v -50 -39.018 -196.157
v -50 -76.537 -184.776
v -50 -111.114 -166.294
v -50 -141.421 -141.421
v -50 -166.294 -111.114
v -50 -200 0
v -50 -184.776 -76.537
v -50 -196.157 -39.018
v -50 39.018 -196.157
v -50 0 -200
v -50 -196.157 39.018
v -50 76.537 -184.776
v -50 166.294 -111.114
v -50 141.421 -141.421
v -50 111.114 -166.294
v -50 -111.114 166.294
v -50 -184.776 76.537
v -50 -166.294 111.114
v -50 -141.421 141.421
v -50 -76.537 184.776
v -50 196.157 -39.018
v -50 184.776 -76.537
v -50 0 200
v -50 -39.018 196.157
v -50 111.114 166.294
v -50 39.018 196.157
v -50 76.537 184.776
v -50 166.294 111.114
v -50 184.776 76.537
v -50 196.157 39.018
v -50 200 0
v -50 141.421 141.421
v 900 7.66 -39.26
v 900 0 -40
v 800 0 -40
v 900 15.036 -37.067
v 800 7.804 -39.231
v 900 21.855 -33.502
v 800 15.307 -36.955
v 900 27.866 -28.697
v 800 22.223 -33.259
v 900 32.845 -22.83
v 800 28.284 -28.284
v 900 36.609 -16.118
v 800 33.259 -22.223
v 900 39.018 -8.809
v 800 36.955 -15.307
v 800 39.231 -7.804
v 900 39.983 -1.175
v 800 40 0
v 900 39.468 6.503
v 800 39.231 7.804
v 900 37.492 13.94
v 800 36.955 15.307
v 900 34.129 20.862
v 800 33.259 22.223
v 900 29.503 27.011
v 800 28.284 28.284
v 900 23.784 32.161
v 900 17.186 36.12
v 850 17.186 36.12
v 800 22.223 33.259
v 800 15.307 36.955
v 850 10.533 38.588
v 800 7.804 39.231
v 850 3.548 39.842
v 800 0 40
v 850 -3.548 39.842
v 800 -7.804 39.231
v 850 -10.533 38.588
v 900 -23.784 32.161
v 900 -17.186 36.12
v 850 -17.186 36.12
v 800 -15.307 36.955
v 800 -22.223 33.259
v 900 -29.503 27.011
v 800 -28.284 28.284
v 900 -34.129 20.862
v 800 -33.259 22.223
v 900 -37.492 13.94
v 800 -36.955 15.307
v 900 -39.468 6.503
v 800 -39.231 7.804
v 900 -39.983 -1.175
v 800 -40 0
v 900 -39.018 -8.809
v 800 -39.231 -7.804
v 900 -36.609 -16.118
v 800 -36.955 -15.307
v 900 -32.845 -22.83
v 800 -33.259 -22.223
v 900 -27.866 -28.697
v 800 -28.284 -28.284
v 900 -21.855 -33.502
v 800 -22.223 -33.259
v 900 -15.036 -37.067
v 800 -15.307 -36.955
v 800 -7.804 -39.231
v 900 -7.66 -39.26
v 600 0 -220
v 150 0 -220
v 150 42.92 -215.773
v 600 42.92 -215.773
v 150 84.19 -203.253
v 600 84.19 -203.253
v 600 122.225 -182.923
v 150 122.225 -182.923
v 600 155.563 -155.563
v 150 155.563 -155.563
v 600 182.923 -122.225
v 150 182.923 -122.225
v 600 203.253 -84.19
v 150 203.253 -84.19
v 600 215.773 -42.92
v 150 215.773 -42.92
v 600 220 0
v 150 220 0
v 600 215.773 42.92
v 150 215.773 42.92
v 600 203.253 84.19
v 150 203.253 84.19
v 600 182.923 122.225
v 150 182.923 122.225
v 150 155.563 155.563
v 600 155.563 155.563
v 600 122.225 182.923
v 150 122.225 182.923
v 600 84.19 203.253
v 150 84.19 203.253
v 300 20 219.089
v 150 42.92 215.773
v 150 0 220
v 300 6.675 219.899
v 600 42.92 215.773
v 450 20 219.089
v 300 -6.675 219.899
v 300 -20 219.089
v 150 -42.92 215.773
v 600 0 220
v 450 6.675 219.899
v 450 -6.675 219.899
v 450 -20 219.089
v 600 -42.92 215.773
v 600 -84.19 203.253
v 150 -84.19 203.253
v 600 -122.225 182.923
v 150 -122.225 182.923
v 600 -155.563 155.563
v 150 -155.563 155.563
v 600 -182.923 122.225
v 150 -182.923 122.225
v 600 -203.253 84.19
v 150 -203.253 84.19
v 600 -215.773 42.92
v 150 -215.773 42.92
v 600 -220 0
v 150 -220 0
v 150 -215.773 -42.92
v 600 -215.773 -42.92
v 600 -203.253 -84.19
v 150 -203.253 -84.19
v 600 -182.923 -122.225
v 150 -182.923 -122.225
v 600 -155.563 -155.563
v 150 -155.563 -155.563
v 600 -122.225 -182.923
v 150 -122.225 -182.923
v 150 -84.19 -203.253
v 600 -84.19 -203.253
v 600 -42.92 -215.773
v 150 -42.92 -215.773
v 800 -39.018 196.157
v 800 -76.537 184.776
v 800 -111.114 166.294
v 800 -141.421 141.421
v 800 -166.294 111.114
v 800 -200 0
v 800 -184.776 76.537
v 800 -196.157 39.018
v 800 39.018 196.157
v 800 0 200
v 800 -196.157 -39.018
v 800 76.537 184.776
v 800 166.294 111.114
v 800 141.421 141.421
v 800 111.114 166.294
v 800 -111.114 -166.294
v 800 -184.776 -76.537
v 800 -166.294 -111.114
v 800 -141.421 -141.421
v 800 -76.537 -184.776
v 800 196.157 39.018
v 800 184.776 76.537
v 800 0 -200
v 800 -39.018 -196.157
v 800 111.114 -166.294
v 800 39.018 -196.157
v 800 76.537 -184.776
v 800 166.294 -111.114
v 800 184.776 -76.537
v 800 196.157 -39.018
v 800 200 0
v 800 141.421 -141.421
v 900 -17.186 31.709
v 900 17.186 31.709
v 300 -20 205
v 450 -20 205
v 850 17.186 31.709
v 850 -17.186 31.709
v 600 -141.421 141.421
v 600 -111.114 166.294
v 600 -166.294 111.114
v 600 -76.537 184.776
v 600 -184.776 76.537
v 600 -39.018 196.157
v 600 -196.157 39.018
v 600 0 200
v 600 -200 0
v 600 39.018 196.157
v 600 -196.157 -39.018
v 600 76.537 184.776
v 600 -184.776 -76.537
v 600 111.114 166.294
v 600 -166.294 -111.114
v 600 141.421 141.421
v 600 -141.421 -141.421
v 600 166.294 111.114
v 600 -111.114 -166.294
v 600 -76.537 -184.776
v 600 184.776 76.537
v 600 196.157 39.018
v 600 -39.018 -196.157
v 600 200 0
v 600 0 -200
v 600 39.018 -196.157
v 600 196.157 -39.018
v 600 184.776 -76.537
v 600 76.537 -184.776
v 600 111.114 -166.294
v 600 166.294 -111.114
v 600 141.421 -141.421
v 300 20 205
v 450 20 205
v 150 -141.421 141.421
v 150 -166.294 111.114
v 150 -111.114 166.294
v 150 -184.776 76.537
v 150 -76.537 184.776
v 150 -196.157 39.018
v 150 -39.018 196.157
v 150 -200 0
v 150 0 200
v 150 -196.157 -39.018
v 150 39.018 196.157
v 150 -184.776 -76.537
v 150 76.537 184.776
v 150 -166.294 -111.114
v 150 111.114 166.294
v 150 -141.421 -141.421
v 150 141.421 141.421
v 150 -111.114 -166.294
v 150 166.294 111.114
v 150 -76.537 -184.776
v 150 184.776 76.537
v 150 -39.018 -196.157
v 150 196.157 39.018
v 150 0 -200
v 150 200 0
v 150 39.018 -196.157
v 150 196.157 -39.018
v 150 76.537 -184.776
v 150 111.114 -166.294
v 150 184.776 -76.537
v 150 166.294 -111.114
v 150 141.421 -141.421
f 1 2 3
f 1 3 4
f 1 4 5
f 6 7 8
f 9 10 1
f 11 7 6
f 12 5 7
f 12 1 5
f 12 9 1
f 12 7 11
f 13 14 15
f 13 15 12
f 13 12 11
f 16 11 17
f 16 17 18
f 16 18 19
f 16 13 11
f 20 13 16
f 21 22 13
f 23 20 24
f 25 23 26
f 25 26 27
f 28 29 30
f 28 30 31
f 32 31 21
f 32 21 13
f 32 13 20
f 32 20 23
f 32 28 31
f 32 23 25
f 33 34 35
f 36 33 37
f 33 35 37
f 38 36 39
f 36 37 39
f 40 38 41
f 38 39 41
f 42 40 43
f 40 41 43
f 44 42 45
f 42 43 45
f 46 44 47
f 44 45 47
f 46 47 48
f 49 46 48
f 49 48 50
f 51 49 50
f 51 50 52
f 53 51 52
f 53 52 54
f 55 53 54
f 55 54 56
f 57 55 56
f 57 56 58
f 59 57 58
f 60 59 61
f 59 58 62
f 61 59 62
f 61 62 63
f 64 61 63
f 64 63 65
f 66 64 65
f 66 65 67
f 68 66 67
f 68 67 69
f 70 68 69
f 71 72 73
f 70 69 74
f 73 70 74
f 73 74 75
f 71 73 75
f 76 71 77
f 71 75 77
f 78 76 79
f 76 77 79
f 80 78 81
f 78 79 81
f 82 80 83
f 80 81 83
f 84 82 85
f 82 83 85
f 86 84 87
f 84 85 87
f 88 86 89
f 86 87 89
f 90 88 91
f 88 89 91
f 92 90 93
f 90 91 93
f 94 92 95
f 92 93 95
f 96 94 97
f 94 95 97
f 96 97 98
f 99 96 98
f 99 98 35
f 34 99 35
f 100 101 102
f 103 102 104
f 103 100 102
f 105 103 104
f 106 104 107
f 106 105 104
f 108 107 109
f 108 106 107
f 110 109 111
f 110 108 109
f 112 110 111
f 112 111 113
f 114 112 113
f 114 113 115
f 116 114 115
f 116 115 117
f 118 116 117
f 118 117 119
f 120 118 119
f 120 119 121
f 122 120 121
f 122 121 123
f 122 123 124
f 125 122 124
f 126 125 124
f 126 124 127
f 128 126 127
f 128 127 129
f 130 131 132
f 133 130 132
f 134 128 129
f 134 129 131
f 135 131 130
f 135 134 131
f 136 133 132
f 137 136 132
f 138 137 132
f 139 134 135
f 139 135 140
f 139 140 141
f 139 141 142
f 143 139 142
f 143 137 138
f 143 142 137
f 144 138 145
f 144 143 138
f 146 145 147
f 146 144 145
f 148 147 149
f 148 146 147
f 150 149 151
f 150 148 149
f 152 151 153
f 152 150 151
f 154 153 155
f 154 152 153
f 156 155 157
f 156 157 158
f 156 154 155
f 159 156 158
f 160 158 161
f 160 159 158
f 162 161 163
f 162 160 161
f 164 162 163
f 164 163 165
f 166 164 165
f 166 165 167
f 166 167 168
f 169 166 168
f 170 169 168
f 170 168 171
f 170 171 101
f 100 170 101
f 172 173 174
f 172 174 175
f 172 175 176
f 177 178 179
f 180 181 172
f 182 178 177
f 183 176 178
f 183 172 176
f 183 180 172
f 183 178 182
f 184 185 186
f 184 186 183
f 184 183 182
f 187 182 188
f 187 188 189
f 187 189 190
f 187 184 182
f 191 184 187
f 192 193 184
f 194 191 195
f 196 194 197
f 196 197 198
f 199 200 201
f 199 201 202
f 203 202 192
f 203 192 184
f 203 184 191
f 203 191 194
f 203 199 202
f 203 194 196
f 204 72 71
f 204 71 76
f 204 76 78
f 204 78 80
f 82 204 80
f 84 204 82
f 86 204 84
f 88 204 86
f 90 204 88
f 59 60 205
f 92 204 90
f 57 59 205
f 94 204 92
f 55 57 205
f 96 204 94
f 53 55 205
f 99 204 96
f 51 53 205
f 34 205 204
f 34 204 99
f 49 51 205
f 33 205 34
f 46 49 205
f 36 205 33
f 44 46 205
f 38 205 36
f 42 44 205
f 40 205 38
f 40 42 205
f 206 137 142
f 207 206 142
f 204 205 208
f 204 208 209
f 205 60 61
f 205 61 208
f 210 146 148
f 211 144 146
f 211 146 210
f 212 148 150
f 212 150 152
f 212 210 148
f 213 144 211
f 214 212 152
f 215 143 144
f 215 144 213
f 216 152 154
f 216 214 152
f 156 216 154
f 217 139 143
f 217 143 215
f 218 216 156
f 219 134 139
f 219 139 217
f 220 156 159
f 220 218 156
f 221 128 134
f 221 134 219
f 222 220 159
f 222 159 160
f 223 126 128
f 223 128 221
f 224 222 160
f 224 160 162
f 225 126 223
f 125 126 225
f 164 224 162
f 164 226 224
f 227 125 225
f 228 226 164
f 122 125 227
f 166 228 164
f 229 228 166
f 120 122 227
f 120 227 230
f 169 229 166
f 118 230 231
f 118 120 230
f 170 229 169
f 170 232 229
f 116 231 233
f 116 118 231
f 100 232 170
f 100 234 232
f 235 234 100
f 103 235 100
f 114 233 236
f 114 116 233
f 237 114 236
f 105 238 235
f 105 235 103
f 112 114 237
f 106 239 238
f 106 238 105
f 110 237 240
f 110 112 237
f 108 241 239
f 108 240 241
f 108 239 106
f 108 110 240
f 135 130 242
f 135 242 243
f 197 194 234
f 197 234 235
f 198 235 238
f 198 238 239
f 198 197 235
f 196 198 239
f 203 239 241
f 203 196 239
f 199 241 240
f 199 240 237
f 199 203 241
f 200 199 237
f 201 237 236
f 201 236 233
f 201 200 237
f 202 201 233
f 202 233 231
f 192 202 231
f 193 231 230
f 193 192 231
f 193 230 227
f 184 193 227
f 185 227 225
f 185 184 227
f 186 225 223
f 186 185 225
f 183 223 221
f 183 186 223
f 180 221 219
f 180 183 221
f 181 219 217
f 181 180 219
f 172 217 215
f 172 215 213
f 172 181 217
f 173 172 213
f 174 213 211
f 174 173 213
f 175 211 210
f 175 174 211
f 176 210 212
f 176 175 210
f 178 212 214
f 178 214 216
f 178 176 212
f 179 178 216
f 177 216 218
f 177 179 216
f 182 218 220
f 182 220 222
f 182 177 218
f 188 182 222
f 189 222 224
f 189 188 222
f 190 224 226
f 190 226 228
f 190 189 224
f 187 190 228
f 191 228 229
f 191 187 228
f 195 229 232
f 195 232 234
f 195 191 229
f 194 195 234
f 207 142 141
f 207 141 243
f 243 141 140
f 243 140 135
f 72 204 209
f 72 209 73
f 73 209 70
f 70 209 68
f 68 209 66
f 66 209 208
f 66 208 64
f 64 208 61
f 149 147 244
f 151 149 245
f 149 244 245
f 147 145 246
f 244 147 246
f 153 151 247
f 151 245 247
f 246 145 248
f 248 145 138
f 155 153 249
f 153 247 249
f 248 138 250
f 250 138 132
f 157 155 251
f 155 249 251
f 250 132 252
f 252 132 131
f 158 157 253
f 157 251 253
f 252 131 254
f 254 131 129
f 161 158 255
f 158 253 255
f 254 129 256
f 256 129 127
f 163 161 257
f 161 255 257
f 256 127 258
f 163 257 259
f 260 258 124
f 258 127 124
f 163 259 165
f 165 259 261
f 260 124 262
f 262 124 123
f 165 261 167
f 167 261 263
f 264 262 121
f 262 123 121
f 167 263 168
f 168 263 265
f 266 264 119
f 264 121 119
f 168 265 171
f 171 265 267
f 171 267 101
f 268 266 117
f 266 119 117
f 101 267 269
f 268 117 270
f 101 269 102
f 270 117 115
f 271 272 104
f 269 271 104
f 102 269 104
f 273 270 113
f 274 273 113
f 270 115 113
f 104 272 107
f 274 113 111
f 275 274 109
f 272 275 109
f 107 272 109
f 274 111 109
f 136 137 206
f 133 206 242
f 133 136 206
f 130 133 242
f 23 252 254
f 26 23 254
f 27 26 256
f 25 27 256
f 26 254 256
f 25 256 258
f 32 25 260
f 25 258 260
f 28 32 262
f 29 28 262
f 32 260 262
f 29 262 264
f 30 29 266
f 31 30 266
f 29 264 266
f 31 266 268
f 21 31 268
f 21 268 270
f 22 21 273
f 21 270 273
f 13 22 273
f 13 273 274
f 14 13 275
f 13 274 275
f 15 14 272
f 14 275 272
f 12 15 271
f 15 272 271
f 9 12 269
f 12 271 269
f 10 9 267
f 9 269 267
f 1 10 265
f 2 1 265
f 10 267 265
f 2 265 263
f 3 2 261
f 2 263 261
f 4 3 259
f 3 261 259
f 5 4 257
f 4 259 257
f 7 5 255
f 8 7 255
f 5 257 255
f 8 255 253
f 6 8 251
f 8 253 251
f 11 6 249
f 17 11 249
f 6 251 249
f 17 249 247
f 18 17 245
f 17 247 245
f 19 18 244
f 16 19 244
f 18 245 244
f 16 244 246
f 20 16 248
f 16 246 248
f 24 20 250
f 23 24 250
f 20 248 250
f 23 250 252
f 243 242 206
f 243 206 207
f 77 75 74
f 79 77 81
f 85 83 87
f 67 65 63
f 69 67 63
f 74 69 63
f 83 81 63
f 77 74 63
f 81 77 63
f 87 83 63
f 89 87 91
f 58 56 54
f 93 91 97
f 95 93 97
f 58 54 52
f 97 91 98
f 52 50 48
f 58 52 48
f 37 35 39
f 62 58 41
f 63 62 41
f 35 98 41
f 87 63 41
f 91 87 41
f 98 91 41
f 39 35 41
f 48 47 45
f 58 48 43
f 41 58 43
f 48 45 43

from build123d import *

# Parameters (mm, degrees)
SKETCH3_R           = 200
BOSS_EXTRUDE2_DEPTH = 200
SKETCH6_R           = 40
BOSS_EXTRUDE5_DEPTH = 100
CUT_EXTRUDE1_DEPTH  = 50
SKETCH5_R           = 220
BOSS_EXTRUDE6_DEPTH = 450
SKETCH9_R           = 200
BOSS_EXTRUDE7_DEPTH = 200
SKETCH10_W          = 150
SKETCH10_H          = 40
CUT_EXTRUDE2_DEPTH  = 15


with BuildPart() as part:
    # Sketch3 → Boss-Extrude2 (new body)
    with BuildSketch(Plane(origin=(800, 0, 0), x_dir=(0, 0, -1), z_dir=(1, 0, 0))):
        Circle(SKETCH3_R)
    extrude(amount=-BOSS_EXTRUDE2_DEPTH)

    # Sketch5 → Boss-Extrude6 (add)
    with BuildSketch(Plane(origin=(600, 0, 0), x_dir=(0, 0, -1), z_dir=(1, 0, 0))):
        Circle(SKETCH5_R)
    extrude(amount=-BOSS_EXTRUDE6_DEPTH)

    # Sketch9 → Boss-Extrude7 (add)
    with BuildSketch(Plane.ZY.offset(-150)):
        Circle(SKETCH9_R)
    extrude(amount=BOSS_EXTRUDE7_DEPTH)

    # Sketch10 → Cut-Extrude2 (cut)
    with BuildSketch(Plane(origin=(600, 0, 220), x_dir=(1, 0, 0), z_dir=(0, 0, 1))):
        with Locations((-225, 0)):
            Rectangle(SKETCH10_W, SKETCH10_H)
    extrude(amount=-CUT_EXTRUDE2_DEPTH, mode=Mode.SUBTRACT)


with BuildPart() as body_2:
    # Sketch6 → Boss-Extrude5 (new body)
    with BuildSketch(Plane(origin=(800, 0, 0), x_dir=(0, 0, -1), z_dir=(1, 0, 0))):
        Circle(SKETCH6_R)
    extrude(amount=BOSS_EXTRUDE5_DEPTH)

    # Sketch8 → Cut-Extrude1 (cut)
    with BuildSketch(Plane(origin=(900, 0, 0), x_dir=(0, 0, -1), z_dir=(1, 0, 0))):
        with BuildLine():
            Line((-36.119828524, 17.185982294), (-31.709283015, 17.185982294))
            Line((-31.709283015, 17.185982294), (-31.709283015, -17.185982294))
            Line((-31.709283015, -17.185982294), (-36.119828524, -17.185982294))
            ThreePointArc((-36.119828524, -17.185982294), (-40, 0), (-36.119828524, 17.185982294))
        make_face()
    extrude(amount=-CUT_EXTRUDE1_DEPTH, mode=Mode.SUBTRACT)


solid = Compound([part.part, body_2.part])
